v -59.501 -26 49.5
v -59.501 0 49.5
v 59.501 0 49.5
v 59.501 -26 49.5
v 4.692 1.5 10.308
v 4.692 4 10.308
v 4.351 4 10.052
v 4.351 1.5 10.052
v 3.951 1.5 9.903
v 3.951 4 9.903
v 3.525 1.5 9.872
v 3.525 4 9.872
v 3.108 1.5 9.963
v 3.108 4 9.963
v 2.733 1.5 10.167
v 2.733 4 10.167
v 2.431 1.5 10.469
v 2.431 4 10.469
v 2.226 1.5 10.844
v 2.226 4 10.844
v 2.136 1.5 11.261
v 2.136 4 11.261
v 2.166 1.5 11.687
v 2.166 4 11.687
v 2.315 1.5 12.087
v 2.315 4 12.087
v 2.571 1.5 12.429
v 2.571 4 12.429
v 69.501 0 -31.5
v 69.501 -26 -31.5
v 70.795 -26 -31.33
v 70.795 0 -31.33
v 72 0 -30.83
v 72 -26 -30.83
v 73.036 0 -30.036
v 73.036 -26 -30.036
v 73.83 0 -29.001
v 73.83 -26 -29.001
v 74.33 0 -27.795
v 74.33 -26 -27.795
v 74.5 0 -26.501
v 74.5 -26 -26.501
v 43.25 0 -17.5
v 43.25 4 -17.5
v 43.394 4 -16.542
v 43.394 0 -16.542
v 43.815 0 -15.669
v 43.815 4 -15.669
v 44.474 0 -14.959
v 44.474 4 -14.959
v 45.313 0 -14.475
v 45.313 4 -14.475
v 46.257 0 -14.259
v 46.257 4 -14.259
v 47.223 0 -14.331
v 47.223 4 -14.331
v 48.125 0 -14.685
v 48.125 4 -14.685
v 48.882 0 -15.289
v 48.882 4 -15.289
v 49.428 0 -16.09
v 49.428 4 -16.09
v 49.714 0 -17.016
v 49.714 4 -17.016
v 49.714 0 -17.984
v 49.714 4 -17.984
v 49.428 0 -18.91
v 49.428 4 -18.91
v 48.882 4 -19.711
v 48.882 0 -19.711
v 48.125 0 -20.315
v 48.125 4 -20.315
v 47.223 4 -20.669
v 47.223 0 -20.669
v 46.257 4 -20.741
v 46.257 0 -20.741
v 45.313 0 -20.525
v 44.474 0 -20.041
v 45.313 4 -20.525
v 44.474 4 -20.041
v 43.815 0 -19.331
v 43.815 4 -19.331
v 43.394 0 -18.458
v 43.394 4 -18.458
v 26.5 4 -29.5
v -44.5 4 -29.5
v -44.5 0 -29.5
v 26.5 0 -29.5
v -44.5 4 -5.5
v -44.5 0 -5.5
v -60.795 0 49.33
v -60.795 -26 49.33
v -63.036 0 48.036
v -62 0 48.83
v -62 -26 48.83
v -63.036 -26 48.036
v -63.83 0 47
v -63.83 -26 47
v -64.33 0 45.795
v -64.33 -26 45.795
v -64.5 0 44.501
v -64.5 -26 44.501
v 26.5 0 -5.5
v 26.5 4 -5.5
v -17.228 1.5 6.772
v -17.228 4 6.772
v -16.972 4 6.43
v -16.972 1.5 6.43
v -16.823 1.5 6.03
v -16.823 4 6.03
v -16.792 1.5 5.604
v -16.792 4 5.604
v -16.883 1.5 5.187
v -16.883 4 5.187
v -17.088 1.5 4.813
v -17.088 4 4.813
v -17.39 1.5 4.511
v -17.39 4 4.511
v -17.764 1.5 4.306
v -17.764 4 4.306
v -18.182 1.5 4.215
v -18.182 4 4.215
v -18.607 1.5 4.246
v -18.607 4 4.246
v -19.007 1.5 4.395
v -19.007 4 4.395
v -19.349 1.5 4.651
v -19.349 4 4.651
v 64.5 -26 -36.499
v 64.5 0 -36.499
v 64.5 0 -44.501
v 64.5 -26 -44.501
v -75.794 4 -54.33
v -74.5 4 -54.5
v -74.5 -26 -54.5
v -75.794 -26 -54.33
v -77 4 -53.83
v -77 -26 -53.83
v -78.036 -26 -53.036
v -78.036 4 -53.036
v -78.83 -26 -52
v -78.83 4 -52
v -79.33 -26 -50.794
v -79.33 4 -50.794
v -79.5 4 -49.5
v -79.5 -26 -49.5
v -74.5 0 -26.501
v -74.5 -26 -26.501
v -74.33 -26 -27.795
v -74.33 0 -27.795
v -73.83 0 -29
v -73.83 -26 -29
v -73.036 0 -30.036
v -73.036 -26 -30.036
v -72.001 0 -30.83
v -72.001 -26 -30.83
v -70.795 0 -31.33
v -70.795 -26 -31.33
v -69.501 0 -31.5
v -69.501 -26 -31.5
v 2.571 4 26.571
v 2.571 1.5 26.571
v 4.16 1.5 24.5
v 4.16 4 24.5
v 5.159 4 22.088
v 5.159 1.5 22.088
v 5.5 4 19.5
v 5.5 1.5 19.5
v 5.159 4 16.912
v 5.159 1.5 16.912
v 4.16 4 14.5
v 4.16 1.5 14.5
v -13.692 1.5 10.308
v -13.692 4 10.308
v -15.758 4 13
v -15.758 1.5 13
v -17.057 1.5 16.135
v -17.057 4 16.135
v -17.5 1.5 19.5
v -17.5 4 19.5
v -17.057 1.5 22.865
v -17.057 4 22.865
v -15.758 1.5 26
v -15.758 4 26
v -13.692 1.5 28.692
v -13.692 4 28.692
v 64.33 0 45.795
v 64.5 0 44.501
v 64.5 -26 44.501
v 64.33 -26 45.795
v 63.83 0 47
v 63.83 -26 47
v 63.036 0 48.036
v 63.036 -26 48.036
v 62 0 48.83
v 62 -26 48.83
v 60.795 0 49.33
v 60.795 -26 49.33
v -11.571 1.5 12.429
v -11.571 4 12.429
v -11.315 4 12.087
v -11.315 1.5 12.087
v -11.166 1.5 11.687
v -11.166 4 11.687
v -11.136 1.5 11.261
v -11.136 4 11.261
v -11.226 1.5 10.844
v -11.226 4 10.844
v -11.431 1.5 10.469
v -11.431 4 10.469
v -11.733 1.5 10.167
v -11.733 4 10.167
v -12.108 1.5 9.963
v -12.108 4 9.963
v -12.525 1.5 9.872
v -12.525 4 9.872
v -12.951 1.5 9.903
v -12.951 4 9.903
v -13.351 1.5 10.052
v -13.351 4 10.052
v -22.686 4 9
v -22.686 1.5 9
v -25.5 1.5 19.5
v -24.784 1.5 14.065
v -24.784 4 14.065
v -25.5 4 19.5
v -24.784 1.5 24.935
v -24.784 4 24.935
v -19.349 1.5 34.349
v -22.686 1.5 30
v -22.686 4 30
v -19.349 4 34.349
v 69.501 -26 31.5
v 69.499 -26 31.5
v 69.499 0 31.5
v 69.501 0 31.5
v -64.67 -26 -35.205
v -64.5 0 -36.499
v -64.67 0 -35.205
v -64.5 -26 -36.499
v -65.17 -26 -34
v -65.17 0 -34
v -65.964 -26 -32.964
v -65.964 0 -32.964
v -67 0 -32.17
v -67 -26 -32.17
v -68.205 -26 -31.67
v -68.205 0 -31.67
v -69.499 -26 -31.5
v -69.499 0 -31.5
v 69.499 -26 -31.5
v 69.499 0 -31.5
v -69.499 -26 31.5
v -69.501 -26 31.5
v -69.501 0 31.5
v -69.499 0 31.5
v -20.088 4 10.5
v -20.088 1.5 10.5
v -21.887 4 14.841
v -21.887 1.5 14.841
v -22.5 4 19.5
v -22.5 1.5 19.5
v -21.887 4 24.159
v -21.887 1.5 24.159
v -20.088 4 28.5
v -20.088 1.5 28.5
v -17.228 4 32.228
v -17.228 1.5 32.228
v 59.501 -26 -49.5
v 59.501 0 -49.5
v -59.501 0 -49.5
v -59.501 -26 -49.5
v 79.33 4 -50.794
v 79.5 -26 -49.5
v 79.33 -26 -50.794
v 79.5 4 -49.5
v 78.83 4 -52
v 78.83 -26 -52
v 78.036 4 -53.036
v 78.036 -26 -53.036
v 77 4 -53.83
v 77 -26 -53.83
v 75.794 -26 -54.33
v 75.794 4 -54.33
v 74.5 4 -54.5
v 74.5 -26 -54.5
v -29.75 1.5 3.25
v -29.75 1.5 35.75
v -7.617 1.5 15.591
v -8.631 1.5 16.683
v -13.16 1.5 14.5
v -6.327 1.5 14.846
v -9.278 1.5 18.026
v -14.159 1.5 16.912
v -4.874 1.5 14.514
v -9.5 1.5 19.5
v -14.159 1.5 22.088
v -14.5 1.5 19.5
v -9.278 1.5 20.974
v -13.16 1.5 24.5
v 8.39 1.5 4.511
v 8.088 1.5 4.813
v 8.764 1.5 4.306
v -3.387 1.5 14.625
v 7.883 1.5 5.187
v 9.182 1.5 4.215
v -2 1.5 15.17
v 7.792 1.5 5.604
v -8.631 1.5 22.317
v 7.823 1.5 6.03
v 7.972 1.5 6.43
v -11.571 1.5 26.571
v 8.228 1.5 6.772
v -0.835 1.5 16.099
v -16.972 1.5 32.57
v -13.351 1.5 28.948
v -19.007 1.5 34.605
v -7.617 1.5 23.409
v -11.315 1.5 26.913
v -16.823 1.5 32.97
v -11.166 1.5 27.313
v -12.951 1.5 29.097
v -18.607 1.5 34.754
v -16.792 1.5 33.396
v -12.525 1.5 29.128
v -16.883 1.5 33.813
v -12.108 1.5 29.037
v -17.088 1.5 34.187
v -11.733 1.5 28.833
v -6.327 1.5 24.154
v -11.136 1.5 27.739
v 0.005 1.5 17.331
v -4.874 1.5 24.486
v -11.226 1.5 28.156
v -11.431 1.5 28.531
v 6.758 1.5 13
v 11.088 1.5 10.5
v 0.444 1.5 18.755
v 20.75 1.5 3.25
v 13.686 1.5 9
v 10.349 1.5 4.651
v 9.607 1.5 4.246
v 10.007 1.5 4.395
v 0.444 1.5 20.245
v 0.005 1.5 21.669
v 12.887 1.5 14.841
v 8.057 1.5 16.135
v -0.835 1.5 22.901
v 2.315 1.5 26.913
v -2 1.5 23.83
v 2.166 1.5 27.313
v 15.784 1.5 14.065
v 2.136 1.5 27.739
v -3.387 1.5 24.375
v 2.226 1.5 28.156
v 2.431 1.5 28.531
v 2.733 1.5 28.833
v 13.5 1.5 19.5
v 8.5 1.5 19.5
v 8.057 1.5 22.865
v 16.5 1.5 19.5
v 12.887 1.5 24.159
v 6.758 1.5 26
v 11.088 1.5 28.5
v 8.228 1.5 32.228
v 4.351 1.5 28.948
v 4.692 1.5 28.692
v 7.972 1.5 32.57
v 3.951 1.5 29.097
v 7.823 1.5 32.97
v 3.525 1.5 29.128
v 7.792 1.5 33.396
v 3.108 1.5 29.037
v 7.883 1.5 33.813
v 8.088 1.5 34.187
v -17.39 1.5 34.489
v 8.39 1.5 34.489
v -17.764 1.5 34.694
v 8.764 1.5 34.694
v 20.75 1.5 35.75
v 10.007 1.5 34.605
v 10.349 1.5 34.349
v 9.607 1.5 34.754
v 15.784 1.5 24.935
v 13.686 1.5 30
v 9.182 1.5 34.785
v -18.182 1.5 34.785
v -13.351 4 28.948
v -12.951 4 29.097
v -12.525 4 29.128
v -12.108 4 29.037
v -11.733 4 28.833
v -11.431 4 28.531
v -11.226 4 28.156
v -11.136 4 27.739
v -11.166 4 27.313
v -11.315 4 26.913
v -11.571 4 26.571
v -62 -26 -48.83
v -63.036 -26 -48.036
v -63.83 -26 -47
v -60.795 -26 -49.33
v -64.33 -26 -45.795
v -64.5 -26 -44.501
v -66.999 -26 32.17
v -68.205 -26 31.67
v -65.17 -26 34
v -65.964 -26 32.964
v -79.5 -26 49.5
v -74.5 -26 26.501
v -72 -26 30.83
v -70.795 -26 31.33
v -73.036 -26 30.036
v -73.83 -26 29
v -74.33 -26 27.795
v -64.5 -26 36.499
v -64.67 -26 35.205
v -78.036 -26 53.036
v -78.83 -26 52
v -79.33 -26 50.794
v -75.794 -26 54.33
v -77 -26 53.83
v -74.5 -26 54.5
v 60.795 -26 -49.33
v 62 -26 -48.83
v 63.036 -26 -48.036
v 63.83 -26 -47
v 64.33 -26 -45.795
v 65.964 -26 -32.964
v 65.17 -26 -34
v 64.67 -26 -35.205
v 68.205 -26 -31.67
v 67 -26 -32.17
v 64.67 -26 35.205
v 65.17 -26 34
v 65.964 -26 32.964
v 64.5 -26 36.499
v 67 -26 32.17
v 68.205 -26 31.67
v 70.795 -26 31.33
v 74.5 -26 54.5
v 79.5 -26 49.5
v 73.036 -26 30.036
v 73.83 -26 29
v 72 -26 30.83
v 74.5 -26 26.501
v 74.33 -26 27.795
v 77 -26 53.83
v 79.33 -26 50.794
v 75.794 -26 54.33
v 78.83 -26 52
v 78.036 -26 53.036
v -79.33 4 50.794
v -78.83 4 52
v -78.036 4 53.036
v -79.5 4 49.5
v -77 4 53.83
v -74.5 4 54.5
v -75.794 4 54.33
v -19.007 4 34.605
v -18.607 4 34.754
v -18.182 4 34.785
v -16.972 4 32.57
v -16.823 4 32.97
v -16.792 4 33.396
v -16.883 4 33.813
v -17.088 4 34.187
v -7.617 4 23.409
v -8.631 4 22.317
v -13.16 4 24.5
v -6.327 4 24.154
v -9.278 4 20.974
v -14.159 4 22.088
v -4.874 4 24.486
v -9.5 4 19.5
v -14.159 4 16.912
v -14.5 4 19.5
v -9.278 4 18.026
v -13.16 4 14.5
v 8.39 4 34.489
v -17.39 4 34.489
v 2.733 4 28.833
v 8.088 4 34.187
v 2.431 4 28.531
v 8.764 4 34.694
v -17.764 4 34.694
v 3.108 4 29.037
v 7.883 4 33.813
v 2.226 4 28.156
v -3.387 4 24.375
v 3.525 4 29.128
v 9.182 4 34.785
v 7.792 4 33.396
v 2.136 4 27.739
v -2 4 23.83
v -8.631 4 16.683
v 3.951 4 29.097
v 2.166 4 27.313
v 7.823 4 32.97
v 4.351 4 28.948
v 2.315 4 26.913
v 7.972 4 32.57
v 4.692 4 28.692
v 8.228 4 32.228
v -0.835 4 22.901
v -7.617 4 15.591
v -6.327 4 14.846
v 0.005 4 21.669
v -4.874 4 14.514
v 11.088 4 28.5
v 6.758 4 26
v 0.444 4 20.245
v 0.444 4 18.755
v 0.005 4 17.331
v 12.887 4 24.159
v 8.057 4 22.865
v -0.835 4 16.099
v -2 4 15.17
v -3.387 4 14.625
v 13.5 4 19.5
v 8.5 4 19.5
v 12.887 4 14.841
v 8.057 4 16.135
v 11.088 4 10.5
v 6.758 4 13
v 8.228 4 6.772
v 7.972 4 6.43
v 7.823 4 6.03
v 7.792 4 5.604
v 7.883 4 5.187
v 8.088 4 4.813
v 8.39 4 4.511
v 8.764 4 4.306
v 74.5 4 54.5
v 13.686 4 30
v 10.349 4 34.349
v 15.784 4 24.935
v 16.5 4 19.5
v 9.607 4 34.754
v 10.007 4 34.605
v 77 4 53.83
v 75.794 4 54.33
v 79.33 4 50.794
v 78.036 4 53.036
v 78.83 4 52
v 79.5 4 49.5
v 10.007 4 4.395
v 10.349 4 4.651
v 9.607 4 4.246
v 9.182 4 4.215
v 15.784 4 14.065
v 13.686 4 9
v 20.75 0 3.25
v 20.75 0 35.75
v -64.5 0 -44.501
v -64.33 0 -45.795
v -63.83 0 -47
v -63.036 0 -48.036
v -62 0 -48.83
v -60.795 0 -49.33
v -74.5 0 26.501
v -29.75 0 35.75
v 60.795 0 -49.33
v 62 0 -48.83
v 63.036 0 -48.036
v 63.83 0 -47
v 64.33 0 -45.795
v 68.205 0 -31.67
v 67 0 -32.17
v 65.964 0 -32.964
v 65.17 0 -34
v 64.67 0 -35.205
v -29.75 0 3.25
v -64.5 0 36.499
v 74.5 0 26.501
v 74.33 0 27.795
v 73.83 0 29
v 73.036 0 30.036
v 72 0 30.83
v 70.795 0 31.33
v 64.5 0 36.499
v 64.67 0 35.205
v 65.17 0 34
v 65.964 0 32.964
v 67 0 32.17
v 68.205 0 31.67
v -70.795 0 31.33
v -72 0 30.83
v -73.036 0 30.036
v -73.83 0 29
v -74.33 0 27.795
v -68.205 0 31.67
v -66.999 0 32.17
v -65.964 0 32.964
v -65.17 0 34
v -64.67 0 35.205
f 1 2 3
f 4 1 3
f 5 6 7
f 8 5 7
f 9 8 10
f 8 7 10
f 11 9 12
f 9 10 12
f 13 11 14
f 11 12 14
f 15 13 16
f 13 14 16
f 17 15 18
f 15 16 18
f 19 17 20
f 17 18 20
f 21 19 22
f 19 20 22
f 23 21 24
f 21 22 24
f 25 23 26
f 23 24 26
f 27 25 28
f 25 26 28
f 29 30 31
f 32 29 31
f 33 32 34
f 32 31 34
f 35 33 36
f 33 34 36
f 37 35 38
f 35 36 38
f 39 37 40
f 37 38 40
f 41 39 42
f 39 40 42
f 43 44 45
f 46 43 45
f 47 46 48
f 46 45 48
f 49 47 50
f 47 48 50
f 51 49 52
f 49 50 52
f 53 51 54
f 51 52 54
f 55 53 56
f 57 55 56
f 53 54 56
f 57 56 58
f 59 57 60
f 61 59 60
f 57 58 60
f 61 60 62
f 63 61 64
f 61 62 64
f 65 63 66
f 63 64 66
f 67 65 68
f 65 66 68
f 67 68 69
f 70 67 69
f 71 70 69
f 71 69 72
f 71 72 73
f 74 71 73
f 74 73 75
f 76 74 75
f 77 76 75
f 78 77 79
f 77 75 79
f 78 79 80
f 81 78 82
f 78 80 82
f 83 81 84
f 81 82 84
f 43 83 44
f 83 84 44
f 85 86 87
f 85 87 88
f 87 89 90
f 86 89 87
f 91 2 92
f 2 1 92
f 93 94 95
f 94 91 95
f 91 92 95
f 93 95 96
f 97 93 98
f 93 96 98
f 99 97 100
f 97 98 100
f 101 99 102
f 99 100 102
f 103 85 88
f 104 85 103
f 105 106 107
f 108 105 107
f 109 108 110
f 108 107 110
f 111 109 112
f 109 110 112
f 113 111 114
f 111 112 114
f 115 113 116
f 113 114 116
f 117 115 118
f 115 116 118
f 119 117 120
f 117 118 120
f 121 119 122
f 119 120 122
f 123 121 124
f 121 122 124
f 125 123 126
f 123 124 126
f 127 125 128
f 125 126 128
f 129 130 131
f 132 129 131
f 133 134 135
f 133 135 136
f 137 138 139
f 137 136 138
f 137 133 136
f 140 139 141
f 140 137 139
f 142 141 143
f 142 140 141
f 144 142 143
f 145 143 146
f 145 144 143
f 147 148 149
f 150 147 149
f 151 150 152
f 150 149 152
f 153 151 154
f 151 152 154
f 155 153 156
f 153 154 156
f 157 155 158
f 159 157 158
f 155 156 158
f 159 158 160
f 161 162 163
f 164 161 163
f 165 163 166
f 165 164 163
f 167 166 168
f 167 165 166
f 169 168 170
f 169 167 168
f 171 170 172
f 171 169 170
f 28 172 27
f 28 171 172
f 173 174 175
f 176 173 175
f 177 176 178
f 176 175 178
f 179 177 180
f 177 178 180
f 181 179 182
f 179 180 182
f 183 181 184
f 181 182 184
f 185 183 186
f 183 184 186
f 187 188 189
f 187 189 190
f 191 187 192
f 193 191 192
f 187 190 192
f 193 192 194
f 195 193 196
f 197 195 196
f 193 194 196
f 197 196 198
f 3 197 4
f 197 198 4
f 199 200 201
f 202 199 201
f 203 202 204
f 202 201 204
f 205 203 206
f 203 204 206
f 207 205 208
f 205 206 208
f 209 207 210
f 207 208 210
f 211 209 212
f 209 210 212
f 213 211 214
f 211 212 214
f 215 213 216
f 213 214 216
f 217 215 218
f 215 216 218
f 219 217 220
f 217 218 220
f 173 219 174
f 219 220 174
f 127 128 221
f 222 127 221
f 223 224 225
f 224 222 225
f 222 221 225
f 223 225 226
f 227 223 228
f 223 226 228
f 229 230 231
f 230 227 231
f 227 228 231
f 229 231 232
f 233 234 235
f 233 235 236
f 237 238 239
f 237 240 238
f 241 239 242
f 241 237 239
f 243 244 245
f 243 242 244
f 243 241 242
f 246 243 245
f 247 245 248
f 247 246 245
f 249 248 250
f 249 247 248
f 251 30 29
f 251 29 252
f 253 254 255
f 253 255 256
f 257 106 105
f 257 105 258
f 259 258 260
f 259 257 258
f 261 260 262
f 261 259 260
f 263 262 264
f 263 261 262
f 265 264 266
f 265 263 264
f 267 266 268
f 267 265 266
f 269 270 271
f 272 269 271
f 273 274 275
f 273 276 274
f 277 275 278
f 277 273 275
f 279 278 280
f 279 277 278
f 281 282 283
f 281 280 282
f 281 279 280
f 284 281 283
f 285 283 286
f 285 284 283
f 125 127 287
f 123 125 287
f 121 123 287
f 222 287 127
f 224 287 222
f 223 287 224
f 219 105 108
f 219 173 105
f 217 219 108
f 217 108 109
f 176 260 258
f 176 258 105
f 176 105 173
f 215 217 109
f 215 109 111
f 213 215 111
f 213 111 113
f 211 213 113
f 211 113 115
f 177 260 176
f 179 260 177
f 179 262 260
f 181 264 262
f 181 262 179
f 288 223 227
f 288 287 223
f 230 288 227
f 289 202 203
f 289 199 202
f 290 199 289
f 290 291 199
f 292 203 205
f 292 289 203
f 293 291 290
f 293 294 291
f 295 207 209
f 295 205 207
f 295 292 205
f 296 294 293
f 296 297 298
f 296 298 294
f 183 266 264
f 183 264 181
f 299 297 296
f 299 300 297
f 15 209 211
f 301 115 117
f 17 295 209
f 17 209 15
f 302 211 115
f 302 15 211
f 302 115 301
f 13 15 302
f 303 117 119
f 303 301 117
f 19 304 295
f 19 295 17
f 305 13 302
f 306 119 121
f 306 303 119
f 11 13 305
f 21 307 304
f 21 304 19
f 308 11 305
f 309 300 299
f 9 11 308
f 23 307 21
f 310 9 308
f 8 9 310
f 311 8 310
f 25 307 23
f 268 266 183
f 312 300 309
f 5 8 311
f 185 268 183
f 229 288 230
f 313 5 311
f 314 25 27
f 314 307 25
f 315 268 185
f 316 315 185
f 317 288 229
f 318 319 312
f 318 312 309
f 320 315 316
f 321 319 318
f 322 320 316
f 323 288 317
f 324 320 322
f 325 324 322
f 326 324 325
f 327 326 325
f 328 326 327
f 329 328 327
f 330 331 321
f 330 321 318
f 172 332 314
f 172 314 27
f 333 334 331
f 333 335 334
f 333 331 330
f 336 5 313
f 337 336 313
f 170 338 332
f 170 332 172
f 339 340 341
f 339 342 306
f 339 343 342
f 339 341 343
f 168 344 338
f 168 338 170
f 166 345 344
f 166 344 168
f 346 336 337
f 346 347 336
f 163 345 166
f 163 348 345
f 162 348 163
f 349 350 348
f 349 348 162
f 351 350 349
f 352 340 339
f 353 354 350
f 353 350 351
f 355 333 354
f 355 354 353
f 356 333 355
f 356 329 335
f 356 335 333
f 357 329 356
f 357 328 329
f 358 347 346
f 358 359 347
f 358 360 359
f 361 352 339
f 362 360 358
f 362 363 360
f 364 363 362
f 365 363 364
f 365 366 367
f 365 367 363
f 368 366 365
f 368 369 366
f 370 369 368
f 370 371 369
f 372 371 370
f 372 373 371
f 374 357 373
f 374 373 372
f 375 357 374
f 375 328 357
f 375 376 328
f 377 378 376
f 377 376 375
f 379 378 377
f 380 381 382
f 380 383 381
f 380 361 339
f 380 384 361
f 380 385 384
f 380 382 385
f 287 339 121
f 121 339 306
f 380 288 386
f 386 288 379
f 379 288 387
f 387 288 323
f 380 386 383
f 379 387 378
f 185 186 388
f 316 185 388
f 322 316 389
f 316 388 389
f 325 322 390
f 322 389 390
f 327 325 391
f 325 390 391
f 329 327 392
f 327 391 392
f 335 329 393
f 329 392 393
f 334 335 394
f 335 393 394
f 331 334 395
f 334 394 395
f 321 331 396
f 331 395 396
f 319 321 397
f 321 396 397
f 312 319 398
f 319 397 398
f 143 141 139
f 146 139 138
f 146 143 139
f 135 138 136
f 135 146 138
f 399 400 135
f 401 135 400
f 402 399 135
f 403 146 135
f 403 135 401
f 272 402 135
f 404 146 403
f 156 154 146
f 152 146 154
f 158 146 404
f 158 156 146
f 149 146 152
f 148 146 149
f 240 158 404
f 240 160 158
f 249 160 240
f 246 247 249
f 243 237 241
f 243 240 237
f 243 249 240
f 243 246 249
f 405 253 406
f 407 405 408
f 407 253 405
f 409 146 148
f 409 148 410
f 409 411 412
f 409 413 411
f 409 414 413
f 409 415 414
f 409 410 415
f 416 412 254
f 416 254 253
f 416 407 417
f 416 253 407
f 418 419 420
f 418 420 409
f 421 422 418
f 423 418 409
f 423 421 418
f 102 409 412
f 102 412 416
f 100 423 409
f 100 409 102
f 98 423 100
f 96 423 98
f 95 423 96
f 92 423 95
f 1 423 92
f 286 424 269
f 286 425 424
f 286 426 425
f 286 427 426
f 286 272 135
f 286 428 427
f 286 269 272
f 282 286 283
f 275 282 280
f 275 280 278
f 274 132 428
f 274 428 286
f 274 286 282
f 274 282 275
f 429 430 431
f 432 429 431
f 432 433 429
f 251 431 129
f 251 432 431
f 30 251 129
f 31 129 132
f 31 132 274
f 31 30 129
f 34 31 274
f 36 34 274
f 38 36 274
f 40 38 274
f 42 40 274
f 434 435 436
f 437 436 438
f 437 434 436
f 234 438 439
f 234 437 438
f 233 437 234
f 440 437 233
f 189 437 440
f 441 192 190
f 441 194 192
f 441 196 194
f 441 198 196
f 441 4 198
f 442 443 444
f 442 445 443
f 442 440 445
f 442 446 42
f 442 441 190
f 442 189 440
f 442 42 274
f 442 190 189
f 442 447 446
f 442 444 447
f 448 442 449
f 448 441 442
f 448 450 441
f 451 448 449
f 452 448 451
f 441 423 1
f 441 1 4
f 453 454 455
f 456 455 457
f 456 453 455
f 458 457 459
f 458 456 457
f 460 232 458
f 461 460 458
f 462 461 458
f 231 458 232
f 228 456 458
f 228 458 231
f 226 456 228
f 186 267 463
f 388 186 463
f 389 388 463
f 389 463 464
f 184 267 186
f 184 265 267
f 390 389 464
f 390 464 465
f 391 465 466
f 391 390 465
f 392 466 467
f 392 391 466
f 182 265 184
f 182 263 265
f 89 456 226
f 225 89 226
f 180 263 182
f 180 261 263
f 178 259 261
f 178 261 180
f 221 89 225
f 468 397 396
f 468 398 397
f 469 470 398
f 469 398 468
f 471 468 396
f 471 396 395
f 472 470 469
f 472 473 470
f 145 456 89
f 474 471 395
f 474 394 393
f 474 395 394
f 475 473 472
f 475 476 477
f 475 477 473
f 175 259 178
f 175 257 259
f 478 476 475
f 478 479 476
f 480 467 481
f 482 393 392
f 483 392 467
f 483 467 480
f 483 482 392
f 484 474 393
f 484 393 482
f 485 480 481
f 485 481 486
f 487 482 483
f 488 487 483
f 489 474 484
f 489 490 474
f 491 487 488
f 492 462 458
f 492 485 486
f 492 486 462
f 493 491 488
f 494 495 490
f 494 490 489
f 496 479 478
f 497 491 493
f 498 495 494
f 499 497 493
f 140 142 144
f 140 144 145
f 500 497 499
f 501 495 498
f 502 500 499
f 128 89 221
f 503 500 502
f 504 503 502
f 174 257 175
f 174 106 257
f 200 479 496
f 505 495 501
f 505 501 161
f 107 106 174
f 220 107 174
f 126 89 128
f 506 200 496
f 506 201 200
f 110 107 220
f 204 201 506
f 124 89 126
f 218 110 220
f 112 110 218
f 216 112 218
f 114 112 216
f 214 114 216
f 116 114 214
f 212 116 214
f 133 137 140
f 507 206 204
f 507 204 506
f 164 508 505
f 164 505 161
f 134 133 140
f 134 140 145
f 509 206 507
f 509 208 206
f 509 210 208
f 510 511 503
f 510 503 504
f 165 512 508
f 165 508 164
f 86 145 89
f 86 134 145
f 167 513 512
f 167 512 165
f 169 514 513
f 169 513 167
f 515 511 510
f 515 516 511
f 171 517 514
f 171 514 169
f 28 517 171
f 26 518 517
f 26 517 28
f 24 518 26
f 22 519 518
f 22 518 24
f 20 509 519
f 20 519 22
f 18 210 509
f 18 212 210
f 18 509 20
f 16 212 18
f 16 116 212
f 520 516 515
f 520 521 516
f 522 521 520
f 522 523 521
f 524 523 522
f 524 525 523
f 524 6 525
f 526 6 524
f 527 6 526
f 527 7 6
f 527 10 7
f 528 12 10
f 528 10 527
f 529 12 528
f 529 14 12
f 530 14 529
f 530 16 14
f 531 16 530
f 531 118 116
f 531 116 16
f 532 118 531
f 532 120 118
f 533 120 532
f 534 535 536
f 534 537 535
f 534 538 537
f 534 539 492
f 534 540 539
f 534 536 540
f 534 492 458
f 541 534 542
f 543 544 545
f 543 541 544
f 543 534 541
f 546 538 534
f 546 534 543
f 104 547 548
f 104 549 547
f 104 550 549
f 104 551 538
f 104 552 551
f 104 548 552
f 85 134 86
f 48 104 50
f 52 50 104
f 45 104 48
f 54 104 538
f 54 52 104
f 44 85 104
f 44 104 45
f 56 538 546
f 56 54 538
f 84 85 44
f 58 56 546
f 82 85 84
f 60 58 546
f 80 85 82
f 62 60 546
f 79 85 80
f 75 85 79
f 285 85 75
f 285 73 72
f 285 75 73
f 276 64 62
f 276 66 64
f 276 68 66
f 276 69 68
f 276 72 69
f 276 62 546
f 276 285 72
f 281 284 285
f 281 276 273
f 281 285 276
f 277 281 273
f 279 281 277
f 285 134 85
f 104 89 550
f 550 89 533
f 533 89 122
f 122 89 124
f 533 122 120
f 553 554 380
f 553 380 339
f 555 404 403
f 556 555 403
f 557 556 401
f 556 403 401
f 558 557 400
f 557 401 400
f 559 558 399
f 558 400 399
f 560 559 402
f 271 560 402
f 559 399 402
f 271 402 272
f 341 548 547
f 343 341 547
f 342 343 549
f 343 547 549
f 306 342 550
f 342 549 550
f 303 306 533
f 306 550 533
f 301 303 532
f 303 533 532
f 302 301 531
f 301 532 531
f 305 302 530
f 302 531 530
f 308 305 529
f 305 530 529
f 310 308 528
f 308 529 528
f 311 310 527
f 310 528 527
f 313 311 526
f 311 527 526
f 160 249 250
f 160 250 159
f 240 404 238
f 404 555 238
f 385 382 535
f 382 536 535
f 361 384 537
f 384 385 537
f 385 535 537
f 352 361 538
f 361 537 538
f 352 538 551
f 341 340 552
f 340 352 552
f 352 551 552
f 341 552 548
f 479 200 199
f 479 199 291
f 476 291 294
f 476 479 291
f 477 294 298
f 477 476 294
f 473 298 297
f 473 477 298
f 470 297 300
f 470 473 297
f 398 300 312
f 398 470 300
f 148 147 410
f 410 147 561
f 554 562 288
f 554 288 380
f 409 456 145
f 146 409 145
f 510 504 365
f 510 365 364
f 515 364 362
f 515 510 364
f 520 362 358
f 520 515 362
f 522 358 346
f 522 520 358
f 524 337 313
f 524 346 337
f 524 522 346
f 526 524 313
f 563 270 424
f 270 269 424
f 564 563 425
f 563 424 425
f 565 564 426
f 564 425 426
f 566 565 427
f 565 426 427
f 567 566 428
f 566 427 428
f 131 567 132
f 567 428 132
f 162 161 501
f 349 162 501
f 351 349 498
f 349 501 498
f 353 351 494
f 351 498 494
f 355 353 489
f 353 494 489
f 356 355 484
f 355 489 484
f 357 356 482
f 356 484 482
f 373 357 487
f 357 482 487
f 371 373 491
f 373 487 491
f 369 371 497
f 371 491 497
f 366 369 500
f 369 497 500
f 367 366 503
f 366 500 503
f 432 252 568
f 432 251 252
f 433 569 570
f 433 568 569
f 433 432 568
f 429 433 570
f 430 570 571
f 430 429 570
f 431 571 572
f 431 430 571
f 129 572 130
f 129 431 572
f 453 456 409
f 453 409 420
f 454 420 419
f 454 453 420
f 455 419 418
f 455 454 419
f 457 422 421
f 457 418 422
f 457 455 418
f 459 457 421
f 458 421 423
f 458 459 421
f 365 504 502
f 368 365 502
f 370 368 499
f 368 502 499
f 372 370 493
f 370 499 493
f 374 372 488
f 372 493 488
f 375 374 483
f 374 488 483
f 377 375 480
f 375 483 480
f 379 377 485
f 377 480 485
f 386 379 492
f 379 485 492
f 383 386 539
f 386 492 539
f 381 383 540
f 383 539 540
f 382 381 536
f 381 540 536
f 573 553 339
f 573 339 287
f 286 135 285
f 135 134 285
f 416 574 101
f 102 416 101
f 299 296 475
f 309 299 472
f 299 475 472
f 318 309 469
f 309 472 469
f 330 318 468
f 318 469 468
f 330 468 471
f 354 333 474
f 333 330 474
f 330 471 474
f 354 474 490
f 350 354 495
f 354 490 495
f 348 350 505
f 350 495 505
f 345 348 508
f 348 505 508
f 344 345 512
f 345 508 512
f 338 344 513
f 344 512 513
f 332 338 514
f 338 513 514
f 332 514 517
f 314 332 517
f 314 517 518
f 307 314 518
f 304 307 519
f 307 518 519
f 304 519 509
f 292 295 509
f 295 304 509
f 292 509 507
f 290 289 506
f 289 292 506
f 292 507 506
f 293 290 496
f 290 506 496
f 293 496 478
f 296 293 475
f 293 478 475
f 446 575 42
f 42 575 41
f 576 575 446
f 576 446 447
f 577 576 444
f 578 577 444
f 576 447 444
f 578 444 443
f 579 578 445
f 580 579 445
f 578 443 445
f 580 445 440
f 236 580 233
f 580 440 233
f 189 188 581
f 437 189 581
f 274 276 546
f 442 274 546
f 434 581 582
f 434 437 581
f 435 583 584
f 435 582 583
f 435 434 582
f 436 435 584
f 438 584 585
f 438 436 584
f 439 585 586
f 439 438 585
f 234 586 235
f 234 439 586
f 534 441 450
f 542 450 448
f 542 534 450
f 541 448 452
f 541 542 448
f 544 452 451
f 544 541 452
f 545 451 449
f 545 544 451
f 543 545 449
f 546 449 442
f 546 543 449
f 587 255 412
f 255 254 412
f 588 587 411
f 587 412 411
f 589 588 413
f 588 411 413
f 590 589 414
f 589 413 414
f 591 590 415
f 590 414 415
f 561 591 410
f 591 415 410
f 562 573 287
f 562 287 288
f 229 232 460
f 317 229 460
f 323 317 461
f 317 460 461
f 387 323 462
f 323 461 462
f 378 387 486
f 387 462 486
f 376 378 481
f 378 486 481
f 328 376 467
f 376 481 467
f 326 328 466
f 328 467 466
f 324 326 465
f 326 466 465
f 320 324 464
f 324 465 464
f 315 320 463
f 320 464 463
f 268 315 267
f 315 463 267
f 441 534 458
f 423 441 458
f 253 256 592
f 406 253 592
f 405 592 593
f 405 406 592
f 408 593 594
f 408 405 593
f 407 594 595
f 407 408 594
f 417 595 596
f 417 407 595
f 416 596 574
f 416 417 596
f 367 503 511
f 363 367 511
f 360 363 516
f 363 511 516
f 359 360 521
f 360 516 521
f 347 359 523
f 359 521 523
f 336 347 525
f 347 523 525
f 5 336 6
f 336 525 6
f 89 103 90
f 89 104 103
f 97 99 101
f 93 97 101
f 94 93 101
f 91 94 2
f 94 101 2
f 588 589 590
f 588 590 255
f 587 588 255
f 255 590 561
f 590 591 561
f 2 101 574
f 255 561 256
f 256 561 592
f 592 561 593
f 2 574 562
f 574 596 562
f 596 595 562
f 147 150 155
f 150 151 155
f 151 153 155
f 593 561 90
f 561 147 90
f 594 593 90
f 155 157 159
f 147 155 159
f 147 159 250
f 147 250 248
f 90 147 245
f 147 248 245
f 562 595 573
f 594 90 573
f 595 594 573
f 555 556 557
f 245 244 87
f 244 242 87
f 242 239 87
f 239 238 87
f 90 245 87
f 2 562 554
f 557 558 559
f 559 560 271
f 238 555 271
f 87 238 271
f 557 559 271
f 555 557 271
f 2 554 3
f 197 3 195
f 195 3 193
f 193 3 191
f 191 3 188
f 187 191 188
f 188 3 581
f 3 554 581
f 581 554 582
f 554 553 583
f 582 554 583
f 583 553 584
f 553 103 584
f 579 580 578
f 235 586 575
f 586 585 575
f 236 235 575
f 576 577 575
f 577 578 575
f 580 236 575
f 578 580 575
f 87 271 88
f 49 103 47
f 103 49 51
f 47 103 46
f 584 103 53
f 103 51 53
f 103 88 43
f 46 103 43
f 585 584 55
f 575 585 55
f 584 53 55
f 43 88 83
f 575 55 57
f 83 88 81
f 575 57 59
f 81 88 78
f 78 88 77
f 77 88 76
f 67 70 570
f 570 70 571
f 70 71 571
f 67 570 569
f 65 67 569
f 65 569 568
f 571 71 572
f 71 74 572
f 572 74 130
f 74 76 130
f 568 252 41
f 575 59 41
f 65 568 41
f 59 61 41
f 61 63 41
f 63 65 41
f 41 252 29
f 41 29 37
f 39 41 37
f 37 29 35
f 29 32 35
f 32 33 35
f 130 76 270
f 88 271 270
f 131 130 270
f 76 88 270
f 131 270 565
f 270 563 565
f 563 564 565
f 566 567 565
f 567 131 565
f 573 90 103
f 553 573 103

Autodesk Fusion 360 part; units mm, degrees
sketch "Skizze1" plane through (0, 0, 0) normal (0, 1, 0) x (1, 0, 0)
  line L0 (-79.5, 54.5) -> (79.5, 54.5)
  line L1 (79.5, 54.5) -> (79.5, -54.5)
  line L2 (79.5, -54.5) -> (-79.5, -54.5)
  line L3 (-79.5, -54.5) -> (-79.5, 54.5)
  line L4 (-79.5, 54.5) -> (79.5, -54.5) construction
  line L5 (79.5, 54.5) -> (-79.5, -54.5) construction
  dimension "d1" = 109
  dimension "d2" = 159
extrude "Extrusion1" add sketch "Skizze1" along normal blind 4
fillet "Abrundung1" radius 5 4 edges at (-79.5, 2, -54.5) (-79.5, 2, 54.5) (79.5, 2, 54.5) (79.5, 2, -54.5)
sketch "Skizze2" plane through (0, 4, 0) normal (0, 1, 0) x (-1, 0, 0)
  arc A0 (-79.5, -49.5) -> (-74.5, -54.5) centre (-74.5, -49.5) ccw
  line L0 (-74.5, -54.5) -> (74.5, -54.5)
  arc A1 (74.5, -54.5) -> (79.5, -49.5) centre (74.5, -49.5) ccw
  line L1 (79.5, -49.5) -> (79.5, 49.5)
  arc A2 (79.5, 49.5) -> (74.5, 54.5) centre (74.5, 49.5) ccw
  line L2 (74.5, 54.5) -> (-74.5, 54.5)
  arc A3 (-74.5, 54.5) -> (-79.5, 49.5) centre (-74.5, 49.5) ccw
  line L3 (-79.5, 49.5) -> (-79.5, -49.5)
  circle A4 centre (-46.5, -17.5) radius 3.25
  line L4 (44.5, -29.5) -> (-26.5, -29.5)
  line L5 (-26.5, -29.5) -> (-26.5, -5.5)
  line L6 (-26.5, -5.5) -> (44.5, -5.5)
  line L7 (44.5, -5.5) -> (44.5, -29.5)
  circle A5 centre (4.5, 19.5) radius 5
  line L8 (4.5, 19.5) -> (-9.2886, 5.7114) construction
  line L9 (4.5, 19.5) -> (-9.2886, 33.2886) construction
  arc A6 (-10.3492, 4.6508) -> (-8.2279, 6.7721) centre (-9.2886, 5.7114) ccw
  arc A7 (-8.2279, 32.2279) -> (-10.3492, 34.3492) centre (-9.2886, 33.2886) ccw
  arc A8 (-2.5711, 26.5711) -> (-4.6924, 28.6924) centre (-3.6317, 27.6317) ccw
  arc A9 (-4.6924, 10.3076) -> (-2.5711, 12.4289) centre (-3.6317, 11.3683) ccw
  arc A10 (-4.6924, 28.6924) -> (-4.6924, 10.3076) centre (4.5, 19.5) ccw
  arc A11 (-2.5711, 26.5711) -> (-2.5711, 12.4289) centre (4.5, 19.5) ccw
  arc A12 (-8.2279, 32.2279) -> (-8.2279, 6.7721) centre (4.5, 19.5) ccw
  arc A13 (-10.3492, 34.3492) -> (-10.3492, 4.6508) centre (4.5, 19.5) ccw
  line L10 (4.5, 19.5) -> (4.5, 4.5) construction
  arc A14 (19.3492, 34.3492) -> (17.2279, 32.2279) centre (18.2886, 33.2886) ccw
  arc A15 (17.2279, 6.7721) -> (19.3492, 4.6508) centre (18.2886, 5.7114) ccw
  arc A16 (19.3492, 4.6508) -> (19.3492, 34.3492) centre (4.5, 19.5) ccw
  arc A17 (11.5711, 12.4289) -> (13.6924, 10.3076) centre (12.6317, 11.3683) ccw
  arc A18 (11.5711, 12.4289) -> (11.5711, 26.5711) centre (4.5, 19.5) ccw
  arc A19 (13.6924, 28.6924) -> (11.5711, 26.5711) centre (12.6317, 27.6317) ccw
  arc A20 (17.2279, 6.7721) -> (17.2279, 32.2279) centre (4.5, 19.5) ccw
  arc A21 (13.6924, 10.3076) -> (13.6924, 28.6924) centre (4.5, 19.5) ccw
  point P0 (18.2886, 33.2886)
  point P1 (18.2886, 5.7114)
  dimension "d7" = 6.5
  dimension "d8" = 71
  dimension "d9" = 24
  dimension "d10" = 35
  dimension "d11" = 25
  dimension "d12" = 20
  dimension "d13" = 12
  dimension "d14" = 10
  dimension "d15" = 5
  dimension "d16" = 5
  dimension "d17" = 3
  dimension "d18" = 3
  dimension "d21" = 35
  dimension "d22" = 75
  dimension "d23" = 45
extrude "Extrusion2" cut sketch "Skizze2" against normal blind 4 contours A4 | L4 L5 L6 L7 | A5 | A6 A7 A12 A13 | A8 A9 A10 A11 | A14 A15 A16 A20 | A17 A18 A19 A21
sketch "Skizze3" plane through (0, 0, 0) normal (0, -1, 0) x (1, 0, 0)
  line L0 (26.5, -5.5) -> (26.5, -29.5)
  line L1 (26.5, -29.5) -> (-44.5, -29.5)
  line L2 (-44.5, -29.5) -> (-44.5, -5.5)
  line L3 (-44.5, -5.5) -> (26.5, -5.5)
  circle A0 centre (46.5, -17.5) radius 3.25
  arc A1 (74.5, -54.5) -> (79.5, -49.5) centre (74.5, -49.5) ccw
  line L4 (79.5, -49.5) -> (79.5, 49.5)
  arc A2 (79.5, 49.5) -> (74.5, 54.5) centre (74.5, 49.5) ccw
  line L5 (74.5, 54.5) -> (-74.5, 54.5)
  line L6 (-79.5, 49.5) -> (-79.5, -49.5)
  arc A3 (-79.5, -49.5) -> (-74.5, -54.5) centre (-74.5, -49.5) ccw
  line L7 (-74.5, -54.5) -> (74.5, -54.5)
sketch "Skizze4" plane through (0, 0, 0) normal (0, -1, 0) x (1, 0, 0)
  arc A0 (10.3492, 4.6508) -> (10.3492, 34.3492) centre (-4.5, 19.5) ccw
  arc A1 (8.2279, 6.7721) -> (10.3492, 4.6508) centre (9.2886, 5.7114) ccw
  arc A2 (8.2279, 6.7721) -> (8.2279, 32.2279) centre (-4.5, 19.5) ccw
  arc A3 (10.3492, 34.3492) -> (8.2279, 32.2279) centre (9.2886, 33.2886) ccw
  arc A4 (-17.2279, 32.2279) -> (-19.3492, 34.3492) centre (-18.2886, 33.2886) ccw
  arc A5 (-17.2279, 32.2279) -> (-17.2279, 6.7721) centre (-4.5, 19.5) ccw
  arc A6 (-19.3492, 4.6508) -> (-17.2279, 6.7721) centre (-18.2886, 5.7114) ccw
  arc A7 (-19.3492, 34.3492) -> (-19.3492, 4.6508) centre (-4.5, 19.5) ccw
  arc A8 (2.5711, 12.4289) -> (4.6924, 10.3076) centre (3.6317, 11.3683) ccw
  arc A9 (2.5711, 12.4289) -> (2.5711, 26.5711) centre (-4.5, 19.5) ccw
  arc A10 (4.6924, 28.6924) -> (2.5711, 26.5711) centre (3.6317, 27.6317) ccw
  arc A11 (4.6924, 10.3076) -> (4.6924, 28.6924) centre (-4.5, 19.5) ccw
  line L0 (26.5, -5.5) -> (26.5, -29.5)
  line L1 (26.5, -29.5) -> (-44.5, -29.5)
  line L2 (-44.5, -29.5) -> (-44.5, -5.5)
  line L3 (-44.5, -5.5) -> (26.5, -5.5)
  arc A12 (-13.6924, 28.6924) -> (-13.6924, 10.3076) centre (-4.5, 19.5) ccw
  arc A13 (-11.5711, 26.5711) -> (-13.6924, 28.6924) centre (-12.6317, 27.6317) ccw
  arc A14 (-11.5711, 26.5711) -> (-11.5711, 12.4289) centre (-4.5, 19.5) ccw
  arc A15 (-13.6924, 10.3076) -> (-11.5711, 12.4289) centre (-12.6317, 11.3683) ccw
  circle A16 centre (-4.5, 19.5) radius 5
  circle A17 centre (46.5, -17.5) radius 3.25
  arc A18 (74.5, -54.5) -> (79.5, -49.5) centre (74.5, -49.5) ccw
  line L4 (79.5, -49.5) -> (79.5, 49.5)
  arc A19 (79.5, 49.5) -> (74.5, 54.5) centre (74.5, 49.5) ccw
  line L5 (74.5, 54.5) -> (-74.5, 54.5)
  arc A20 (-74.5, 54.5) -> (-79.5, 49.5) centre (-74.5, 49.5) ccw
  line L6 (-79.5, 49.5) -> (-79.5, -49.5)
  arc A21 (-79.5, -49.5) -> (-74.5, -54.5) centre (-74.5, -49.5) ccw
  line L7 (-74.5, -54.5) -> (74.5, -54.5)
  line L8 (-29.75, 35.75) -> (20.75, 35.75)
  line L9 (20.75, 35.75) -> (20.75, 3.25)
  line L10 (20.75, 3.25) -> (-29.75, 3.25)
  line L11 (-29.75, 3.25) -> (-29.75, 35.75)
  line L12 (-29.75, 35.75) -> (20.75, 3.25) construction
  line L13 (20.75, 35.75) -> (-29.75, 3.25) construction
  point P0 (-4.5, 19.5)
  dimension "d50" = 50.5
  dimension "d51" = 32.5
extrude "Extrusion3" cut sketch "Skizze4" against normal blind 1.5 contours L8 L9 L10 L11
sketch "Skizze5" plane through (0, 0, 0) normal (0, -1, 0) x (1, 0, 0)
  line L0 (20.75, 35.75) -> (20.75, 3.25)
  line L1 (20.75, 3.25) -> (-29.75, 3.25)
  line L2 (-29.75, 3.25) -> (-29.75, 35.75)
  line L3 (-29.75, 35.75) -> (20.75, 35.75)
  line L4 (26.5, -5.5) -> (26.5, -29.5)
  line L5 (26.5, -29.5) -> (-44.5, -29.5)
  line L6 (-44.5, -29.5) -> (-44.5, -5.5)
  line L7 (-44.5, -5.5) -> (26.5, -5.5)
  circle A0 centre (46.5, -17.5) radius 3.25
  arc A1 (74.5, -54.5) -> (79.5, -49.5) centre (74.5, -49.5) ccw
  line L8 (79.5, -49.5) -> (79.5, 49.5)
  arc A2 (79.5, 49.5) -> (74.5, 54.5) centre (74.5, 49.5) ccw
  line L9 (74.5, 54.5) -> (-74.5, 54.5)
  arc A3 (-74.5, 54.5) -> (-79.5, 49.5) centre (-74.5, 49.5) ccw
  line L10 (-79.5, 49.5) -> (-79.5, -49.5)
  arc A4 (-79.5, -49.5) -> (-74.5, -54.5) centre (-74.5, -49.5) ccw
  line L11 (-74.5, -54.5) -> (74.5, -54.5)
  line L12 (74.5, 54.5) -> (-74.5, 54.5)
  arc A5 (-74.5, 54.5) -> (-79.5, 49.5) centre (-74.5, 49.5) ccw
  line L13 (-79.5, 49.5) -> (-79.5, -49.5)
  arc A6 (-79.5, -49.5) -> (-74.5, -54.5) centre (-74.5, -49.5) ccw
  line L14 (-74.5, -54.5) -> (74.5, -54.5)
  arc A7 (74.5, -54.5) -> (79.5, -49.5) centre (74.5, -49.5) ccw
  line L15 (79.5, -49.5) -> (79.5, 49.5)
  arc A8 (79.5, 49.5) -> (74.5, 54.5) centre (74.5, 49.5) ccw
  line L16 (-64.5, 49.5) -> (64.5, 49.5)
  line L17 (64.5, 49.5) -> (64.5, 31.5)
  line L18 (64.5, 31.5) -> (74.5, 31.5)
  line L19 (74.5, 31.5) -> (74.5, -31.5)
  line L20 (74.5, -31.5) -> (64.5, -31.5)
  line L21 (64.5, -31.5) -> (64.5, -49.5)
  line L22 (64.5, -49.5) -> (-64.5, -49.5)
  line L23 (-64.5, -49.5) -> (-64.5, -31.5)
  line L24 (-64.5, -31.5) -> (-74.5, -31.5)
  line L25 (-74.5, -31.5) -> (-74.5, 31.5)
  line L26 (-74.5, 31.5) -> (-64.5, 31.5)
  line L27 (-64.5, 31.5) -> (-64.5, 49.5)
  dimension "d54" = 5
  dimension "d55" = 5
  dimension "d56" = 5
  dimension "d57" = 5
  dimension "d58" = 15
  dimension "d59" = 23
extrude "Extrusion4" add sketch "Skizze5" along normal blind 26 contours A1 L8 A2 L9 A3 L10 A4 L11 L12 A5 L13 A6 L14 A7 L15 A8
fillet "Abrundung2" radius 5 12 edges at (64.5, -13, 49.5) (64.5, -13, 31.5) (74.5, -13, 31.5) (64.5, -13, -31.5) (74.5, -13, -31.5) (64.5, -13, -49.5) (-64.5, -13, -49.5) (-64.5, -13, -31.5) (-74.5, -13, -31.5) (-64.5, -13, 31.5) (-74.5, -13, 31.5) (-64.5, -13, 49.5)
equation "d13 = d9 / 2"
equation "d15 = d16"
equation "d17 = d18"
